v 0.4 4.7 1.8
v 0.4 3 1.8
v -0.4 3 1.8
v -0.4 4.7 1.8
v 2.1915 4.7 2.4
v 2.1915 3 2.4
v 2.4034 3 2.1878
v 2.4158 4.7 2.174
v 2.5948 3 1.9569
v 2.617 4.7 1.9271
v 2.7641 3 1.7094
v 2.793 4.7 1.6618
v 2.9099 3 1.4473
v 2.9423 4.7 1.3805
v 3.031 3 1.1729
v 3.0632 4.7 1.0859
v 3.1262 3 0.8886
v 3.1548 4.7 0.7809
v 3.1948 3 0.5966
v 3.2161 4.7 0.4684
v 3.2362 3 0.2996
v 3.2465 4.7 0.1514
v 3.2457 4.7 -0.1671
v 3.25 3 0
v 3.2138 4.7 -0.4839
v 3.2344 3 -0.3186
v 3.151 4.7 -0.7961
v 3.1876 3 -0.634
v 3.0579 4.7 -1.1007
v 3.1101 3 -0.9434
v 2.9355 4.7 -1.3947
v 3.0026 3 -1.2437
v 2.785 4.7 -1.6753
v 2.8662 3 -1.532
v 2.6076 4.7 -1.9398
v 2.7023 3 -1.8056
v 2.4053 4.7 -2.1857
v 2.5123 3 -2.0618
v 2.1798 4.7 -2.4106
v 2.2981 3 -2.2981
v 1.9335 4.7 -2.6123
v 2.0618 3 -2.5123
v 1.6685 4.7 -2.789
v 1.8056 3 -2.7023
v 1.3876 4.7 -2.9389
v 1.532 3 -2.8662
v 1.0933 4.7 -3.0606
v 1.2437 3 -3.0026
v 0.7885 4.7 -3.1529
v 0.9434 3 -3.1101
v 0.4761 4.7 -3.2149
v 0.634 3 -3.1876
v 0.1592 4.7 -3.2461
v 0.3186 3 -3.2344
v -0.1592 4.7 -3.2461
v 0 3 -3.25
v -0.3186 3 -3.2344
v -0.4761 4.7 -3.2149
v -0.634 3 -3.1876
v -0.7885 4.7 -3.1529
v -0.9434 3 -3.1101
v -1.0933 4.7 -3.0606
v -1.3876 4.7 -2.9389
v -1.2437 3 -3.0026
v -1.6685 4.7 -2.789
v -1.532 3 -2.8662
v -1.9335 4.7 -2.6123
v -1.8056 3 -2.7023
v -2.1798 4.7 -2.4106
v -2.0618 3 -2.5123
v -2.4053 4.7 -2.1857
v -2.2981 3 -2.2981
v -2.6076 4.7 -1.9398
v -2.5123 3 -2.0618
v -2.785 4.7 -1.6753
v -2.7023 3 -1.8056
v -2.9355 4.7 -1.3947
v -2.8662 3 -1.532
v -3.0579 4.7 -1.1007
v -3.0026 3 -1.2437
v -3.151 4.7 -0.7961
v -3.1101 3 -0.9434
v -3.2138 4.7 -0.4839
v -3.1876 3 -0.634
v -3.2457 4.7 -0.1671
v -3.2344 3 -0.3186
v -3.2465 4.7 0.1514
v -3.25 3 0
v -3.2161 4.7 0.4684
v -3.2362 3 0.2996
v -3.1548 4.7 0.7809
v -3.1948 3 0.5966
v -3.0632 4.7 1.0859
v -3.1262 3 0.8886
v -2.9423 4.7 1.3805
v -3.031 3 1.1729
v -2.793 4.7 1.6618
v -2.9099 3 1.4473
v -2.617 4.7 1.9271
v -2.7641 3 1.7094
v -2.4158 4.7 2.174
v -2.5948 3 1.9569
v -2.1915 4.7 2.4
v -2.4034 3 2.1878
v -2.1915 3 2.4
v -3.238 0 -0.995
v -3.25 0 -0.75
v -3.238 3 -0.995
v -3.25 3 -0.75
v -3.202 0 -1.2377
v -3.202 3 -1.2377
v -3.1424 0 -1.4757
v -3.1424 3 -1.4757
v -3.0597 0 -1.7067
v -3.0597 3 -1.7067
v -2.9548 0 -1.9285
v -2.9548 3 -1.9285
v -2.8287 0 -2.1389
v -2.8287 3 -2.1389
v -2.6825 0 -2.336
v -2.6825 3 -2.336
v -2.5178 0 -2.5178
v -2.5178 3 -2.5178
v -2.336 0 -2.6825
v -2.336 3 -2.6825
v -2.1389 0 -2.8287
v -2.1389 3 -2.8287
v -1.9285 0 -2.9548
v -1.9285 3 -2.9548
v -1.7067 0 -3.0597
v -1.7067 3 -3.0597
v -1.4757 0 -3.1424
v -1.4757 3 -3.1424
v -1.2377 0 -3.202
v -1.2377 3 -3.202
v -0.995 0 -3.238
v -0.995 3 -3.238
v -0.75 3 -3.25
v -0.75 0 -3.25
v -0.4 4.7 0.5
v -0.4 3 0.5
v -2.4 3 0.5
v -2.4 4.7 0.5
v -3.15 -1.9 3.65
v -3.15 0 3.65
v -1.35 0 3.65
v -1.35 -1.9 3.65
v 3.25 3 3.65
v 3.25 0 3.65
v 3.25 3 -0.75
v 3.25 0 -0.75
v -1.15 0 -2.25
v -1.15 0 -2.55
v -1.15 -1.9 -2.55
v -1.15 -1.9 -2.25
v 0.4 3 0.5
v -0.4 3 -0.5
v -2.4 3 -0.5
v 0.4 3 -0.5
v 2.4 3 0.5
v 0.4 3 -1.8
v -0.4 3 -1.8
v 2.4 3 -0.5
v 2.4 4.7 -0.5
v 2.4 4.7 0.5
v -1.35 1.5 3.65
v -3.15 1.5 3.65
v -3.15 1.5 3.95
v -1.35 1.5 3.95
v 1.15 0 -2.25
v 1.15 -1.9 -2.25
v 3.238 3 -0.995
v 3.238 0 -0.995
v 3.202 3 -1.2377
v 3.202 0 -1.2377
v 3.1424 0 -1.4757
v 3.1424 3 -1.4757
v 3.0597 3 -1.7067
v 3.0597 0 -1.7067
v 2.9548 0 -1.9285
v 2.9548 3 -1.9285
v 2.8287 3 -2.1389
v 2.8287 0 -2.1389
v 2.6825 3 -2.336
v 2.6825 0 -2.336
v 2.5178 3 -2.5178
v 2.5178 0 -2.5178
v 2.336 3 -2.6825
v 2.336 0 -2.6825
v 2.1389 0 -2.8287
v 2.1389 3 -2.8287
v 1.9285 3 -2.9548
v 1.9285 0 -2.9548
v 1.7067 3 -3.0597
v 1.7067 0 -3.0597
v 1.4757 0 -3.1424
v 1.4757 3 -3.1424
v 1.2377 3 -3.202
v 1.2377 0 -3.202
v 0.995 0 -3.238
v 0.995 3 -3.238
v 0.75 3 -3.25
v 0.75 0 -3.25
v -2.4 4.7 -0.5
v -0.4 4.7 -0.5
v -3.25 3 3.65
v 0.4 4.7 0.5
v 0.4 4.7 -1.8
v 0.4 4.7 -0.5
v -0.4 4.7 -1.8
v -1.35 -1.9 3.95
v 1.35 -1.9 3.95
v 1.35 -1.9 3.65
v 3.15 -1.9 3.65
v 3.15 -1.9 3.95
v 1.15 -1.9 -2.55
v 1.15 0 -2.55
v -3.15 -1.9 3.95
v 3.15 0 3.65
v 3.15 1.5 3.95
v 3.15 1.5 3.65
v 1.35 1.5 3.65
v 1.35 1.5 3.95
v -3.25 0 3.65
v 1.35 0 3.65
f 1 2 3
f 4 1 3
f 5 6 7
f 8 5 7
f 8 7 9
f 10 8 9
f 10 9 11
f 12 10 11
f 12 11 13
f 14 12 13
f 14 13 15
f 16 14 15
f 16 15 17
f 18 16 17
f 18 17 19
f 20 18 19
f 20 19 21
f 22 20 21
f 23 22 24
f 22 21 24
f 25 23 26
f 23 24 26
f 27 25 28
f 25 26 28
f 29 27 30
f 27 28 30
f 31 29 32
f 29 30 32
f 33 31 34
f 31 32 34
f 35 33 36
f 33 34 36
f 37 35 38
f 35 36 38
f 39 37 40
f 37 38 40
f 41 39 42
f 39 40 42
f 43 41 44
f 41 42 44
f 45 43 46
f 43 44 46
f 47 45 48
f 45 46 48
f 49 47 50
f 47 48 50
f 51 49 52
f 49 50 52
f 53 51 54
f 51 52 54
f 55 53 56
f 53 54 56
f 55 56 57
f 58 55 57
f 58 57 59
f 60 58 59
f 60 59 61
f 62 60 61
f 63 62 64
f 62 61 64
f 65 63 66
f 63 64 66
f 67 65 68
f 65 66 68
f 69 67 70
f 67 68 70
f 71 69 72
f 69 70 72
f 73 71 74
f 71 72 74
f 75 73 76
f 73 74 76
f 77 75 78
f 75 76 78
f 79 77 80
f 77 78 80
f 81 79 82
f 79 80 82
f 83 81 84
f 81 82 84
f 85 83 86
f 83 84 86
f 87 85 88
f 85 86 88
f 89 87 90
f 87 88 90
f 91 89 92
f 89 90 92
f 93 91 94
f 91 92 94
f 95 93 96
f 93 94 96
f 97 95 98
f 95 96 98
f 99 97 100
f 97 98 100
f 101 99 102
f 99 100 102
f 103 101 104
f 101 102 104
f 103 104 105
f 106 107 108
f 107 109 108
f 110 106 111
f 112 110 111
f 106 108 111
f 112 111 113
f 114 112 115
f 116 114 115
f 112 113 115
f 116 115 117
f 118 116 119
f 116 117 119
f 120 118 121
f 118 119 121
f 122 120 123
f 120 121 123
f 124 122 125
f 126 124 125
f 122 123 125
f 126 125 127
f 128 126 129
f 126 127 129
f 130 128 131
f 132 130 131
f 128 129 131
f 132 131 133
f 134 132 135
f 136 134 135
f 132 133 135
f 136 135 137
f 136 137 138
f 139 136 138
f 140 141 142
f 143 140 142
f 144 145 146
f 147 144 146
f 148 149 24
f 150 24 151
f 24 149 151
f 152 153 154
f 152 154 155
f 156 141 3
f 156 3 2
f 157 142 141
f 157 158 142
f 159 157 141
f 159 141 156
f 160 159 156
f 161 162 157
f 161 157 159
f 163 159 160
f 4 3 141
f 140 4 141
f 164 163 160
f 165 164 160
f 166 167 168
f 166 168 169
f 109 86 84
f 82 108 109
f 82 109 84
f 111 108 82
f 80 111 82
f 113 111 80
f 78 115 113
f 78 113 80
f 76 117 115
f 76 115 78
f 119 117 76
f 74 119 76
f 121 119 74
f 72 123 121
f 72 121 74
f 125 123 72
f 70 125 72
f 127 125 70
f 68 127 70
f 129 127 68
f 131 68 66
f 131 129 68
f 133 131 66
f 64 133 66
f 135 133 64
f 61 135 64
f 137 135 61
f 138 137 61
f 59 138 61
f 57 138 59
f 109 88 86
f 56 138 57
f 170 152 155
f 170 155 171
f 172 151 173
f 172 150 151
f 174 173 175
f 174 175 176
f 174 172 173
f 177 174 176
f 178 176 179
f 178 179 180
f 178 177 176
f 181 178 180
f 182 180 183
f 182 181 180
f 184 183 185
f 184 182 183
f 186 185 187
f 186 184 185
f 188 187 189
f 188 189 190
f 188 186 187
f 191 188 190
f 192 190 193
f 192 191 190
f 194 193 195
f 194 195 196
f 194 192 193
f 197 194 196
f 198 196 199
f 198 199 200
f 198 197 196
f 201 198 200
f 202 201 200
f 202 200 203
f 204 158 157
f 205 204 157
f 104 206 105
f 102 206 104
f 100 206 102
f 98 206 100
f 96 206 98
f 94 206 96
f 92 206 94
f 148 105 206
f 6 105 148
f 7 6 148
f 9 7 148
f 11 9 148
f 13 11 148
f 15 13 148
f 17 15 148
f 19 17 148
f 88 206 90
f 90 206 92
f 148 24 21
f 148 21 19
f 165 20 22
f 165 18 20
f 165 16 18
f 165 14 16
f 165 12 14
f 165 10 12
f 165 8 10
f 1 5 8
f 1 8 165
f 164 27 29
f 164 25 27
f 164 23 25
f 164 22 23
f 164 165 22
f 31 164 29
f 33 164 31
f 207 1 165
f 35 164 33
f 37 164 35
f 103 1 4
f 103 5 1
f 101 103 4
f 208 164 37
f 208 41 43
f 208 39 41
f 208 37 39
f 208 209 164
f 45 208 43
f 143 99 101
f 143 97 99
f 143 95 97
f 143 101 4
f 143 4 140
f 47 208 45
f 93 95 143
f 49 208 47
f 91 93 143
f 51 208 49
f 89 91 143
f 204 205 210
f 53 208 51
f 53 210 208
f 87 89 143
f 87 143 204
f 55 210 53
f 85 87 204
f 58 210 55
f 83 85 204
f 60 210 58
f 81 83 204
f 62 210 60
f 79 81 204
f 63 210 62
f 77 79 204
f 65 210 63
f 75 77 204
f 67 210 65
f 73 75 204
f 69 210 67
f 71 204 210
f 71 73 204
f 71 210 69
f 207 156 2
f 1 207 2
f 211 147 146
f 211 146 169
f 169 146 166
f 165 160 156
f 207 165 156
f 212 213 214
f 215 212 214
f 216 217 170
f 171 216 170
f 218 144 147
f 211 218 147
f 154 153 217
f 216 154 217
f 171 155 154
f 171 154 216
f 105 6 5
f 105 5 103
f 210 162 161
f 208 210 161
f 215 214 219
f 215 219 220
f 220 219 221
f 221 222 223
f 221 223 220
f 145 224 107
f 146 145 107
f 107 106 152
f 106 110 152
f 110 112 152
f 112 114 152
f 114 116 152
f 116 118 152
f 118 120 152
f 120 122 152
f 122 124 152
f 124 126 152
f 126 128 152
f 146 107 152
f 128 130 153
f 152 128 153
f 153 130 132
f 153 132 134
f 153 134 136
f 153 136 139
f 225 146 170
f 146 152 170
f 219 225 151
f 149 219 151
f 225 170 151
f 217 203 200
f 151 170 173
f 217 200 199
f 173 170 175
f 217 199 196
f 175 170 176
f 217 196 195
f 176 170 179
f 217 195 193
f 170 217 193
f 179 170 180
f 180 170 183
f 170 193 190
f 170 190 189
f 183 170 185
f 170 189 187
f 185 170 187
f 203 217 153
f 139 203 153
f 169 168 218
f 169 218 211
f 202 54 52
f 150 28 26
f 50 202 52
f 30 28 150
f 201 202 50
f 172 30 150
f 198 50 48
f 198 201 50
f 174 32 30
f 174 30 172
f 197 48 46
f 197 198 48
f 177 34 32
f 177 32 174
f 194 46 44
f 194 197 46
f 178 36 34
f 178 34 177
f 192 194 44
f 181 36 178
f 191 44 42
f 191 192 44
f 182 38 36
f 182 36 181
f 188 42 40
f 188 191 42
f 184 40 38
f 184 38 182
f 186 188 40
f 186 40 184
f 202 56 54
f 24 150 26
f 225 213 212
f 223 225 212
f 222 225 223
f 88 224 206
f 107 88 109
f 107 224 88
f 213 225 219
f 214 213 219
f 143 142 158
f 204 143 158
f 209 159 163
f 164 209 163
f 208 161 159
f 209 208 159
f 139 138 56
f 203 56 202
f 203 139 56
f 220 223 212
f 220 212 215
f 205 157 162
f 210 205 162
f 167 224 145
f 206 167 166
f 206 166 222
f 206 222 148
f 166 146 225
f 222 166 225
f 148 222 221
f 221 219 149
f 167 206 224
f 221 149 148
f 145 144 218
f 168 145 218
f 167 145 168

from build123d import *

# Parameters (mm, degrees)
SKETCH_1_W          = 6.5
SKETCH_1_H          = 6.9
EXTRUDE_1_DEPTH     = 3
EXTRUDE_START       = 3
SKETCH_1_3_R        = 3.25
EXTRUDE_2_DEPTH     = 1.7
CUT_EXTRUDE_START   = 3
CUT_EXTRUDE_1_DEPTH = 1.7
FILLET_1_R          = 2.5
SKETCH_2_W          = 1.8
SKETCH_2_H          = 3.4
EXTRUDE_3_DEPTH     = 0.3
SKETCH_3_W          = 2.3
SKETCH_3_H          = 0.3
EXTRUDE_4_DEPTH     = 1.9


with BuildPart() as part:
    # 草图1 → 凸台-拉伸1 (new body)
    with BuildSketch(Plane(origin=(0, 0, 0), x_dir=(1, 0, 0), z_dir=(0, 1, 0))):
        with Locations((0, -0.2)):
            Rectangle(SKETCH_1_W, SKETCH_1_H)
    extrude(amount=EXTRUDE_1_DEPTH)

    # 草图1<3> → 凸台-拉伸2 (add)
    with BuildSketch(Plane(origin=(0, 0, 0), x_dir=(1, 0, 0), z_dir=(0, 1, 0)).offset(EXTRUDE_START)):
        with Locations(Location((0, 0, 0), (0, 0, 90))):
            Circle(SKETCH_1_3_R)
        Polygon((-2.4, -0.5), (-2.4, 0.5), (-0.4, 0.5), (-0.4, 1.8), (0.4, 1.8), (0.4, 0.5), (2.4, 0.5), (2.4, -0.5), (0.4, -0.5), (0.4, -1.8), (-0.4, -1.8), (-0.4, -0.5), align=None, mode=Mode.SUBTRACT)
    extrude(amount=EXTRUDE_2_DEPTH)

    # 草图1<4> → 切除-拉伸1 (cut)
    with BuildSketch(Plane(origin=(0, 0, 0), x_dir=(1, 0, 0), z_dir=(0, 1, 0)).offset(CUT_EXTRUDE_START)):
        with BuildLine():
            Line((2.1914607, -2.4), (-2.1914607, -2.4))
            ThreePointArc((-2.1914607, -2.4), (0, -3.25), (2.1914607, -2.4))
        make_face()
    extrude(amount=CUT_EXTRUDE_1_DEPTH, mode=Mode.SUBTRACT)

    # 圆角1
    fillet_1_edges = [part.edges().sort_by_distance(p)[0] for p in [
        (-3.25, 1.5, -3.25),
        (3.25, 1.5, -3.25),
    ]]
    fillet(fillet_1_edges, radius=FILLET_1_R)

    # 草图2 → 凸台-拉伸3 (add)
    with BuildSketch(Plane.XY.offset(3.65)):
        with Locations((-2.25, -0.2)):
            Rectangle(SKETCH_2_W, SKETCH_2_H)
        with Locations((2.25, -0.2)):
            Rectangle(SKETCH_2_W, SKETCH_2_H)
    extrude(amount=EXTRUDE_3_DEPTH)

    # 草图3 → 凸台-拉伸4 (add)
    with BuildSketch(Plane.XZ):
        with Locations((0, -2.4)):
            Rectangle(SKETCH_3_W, SKETCH_3_H)
    extrude(amount=EXTRUDE_4_DEPTH)


solid = part.part
